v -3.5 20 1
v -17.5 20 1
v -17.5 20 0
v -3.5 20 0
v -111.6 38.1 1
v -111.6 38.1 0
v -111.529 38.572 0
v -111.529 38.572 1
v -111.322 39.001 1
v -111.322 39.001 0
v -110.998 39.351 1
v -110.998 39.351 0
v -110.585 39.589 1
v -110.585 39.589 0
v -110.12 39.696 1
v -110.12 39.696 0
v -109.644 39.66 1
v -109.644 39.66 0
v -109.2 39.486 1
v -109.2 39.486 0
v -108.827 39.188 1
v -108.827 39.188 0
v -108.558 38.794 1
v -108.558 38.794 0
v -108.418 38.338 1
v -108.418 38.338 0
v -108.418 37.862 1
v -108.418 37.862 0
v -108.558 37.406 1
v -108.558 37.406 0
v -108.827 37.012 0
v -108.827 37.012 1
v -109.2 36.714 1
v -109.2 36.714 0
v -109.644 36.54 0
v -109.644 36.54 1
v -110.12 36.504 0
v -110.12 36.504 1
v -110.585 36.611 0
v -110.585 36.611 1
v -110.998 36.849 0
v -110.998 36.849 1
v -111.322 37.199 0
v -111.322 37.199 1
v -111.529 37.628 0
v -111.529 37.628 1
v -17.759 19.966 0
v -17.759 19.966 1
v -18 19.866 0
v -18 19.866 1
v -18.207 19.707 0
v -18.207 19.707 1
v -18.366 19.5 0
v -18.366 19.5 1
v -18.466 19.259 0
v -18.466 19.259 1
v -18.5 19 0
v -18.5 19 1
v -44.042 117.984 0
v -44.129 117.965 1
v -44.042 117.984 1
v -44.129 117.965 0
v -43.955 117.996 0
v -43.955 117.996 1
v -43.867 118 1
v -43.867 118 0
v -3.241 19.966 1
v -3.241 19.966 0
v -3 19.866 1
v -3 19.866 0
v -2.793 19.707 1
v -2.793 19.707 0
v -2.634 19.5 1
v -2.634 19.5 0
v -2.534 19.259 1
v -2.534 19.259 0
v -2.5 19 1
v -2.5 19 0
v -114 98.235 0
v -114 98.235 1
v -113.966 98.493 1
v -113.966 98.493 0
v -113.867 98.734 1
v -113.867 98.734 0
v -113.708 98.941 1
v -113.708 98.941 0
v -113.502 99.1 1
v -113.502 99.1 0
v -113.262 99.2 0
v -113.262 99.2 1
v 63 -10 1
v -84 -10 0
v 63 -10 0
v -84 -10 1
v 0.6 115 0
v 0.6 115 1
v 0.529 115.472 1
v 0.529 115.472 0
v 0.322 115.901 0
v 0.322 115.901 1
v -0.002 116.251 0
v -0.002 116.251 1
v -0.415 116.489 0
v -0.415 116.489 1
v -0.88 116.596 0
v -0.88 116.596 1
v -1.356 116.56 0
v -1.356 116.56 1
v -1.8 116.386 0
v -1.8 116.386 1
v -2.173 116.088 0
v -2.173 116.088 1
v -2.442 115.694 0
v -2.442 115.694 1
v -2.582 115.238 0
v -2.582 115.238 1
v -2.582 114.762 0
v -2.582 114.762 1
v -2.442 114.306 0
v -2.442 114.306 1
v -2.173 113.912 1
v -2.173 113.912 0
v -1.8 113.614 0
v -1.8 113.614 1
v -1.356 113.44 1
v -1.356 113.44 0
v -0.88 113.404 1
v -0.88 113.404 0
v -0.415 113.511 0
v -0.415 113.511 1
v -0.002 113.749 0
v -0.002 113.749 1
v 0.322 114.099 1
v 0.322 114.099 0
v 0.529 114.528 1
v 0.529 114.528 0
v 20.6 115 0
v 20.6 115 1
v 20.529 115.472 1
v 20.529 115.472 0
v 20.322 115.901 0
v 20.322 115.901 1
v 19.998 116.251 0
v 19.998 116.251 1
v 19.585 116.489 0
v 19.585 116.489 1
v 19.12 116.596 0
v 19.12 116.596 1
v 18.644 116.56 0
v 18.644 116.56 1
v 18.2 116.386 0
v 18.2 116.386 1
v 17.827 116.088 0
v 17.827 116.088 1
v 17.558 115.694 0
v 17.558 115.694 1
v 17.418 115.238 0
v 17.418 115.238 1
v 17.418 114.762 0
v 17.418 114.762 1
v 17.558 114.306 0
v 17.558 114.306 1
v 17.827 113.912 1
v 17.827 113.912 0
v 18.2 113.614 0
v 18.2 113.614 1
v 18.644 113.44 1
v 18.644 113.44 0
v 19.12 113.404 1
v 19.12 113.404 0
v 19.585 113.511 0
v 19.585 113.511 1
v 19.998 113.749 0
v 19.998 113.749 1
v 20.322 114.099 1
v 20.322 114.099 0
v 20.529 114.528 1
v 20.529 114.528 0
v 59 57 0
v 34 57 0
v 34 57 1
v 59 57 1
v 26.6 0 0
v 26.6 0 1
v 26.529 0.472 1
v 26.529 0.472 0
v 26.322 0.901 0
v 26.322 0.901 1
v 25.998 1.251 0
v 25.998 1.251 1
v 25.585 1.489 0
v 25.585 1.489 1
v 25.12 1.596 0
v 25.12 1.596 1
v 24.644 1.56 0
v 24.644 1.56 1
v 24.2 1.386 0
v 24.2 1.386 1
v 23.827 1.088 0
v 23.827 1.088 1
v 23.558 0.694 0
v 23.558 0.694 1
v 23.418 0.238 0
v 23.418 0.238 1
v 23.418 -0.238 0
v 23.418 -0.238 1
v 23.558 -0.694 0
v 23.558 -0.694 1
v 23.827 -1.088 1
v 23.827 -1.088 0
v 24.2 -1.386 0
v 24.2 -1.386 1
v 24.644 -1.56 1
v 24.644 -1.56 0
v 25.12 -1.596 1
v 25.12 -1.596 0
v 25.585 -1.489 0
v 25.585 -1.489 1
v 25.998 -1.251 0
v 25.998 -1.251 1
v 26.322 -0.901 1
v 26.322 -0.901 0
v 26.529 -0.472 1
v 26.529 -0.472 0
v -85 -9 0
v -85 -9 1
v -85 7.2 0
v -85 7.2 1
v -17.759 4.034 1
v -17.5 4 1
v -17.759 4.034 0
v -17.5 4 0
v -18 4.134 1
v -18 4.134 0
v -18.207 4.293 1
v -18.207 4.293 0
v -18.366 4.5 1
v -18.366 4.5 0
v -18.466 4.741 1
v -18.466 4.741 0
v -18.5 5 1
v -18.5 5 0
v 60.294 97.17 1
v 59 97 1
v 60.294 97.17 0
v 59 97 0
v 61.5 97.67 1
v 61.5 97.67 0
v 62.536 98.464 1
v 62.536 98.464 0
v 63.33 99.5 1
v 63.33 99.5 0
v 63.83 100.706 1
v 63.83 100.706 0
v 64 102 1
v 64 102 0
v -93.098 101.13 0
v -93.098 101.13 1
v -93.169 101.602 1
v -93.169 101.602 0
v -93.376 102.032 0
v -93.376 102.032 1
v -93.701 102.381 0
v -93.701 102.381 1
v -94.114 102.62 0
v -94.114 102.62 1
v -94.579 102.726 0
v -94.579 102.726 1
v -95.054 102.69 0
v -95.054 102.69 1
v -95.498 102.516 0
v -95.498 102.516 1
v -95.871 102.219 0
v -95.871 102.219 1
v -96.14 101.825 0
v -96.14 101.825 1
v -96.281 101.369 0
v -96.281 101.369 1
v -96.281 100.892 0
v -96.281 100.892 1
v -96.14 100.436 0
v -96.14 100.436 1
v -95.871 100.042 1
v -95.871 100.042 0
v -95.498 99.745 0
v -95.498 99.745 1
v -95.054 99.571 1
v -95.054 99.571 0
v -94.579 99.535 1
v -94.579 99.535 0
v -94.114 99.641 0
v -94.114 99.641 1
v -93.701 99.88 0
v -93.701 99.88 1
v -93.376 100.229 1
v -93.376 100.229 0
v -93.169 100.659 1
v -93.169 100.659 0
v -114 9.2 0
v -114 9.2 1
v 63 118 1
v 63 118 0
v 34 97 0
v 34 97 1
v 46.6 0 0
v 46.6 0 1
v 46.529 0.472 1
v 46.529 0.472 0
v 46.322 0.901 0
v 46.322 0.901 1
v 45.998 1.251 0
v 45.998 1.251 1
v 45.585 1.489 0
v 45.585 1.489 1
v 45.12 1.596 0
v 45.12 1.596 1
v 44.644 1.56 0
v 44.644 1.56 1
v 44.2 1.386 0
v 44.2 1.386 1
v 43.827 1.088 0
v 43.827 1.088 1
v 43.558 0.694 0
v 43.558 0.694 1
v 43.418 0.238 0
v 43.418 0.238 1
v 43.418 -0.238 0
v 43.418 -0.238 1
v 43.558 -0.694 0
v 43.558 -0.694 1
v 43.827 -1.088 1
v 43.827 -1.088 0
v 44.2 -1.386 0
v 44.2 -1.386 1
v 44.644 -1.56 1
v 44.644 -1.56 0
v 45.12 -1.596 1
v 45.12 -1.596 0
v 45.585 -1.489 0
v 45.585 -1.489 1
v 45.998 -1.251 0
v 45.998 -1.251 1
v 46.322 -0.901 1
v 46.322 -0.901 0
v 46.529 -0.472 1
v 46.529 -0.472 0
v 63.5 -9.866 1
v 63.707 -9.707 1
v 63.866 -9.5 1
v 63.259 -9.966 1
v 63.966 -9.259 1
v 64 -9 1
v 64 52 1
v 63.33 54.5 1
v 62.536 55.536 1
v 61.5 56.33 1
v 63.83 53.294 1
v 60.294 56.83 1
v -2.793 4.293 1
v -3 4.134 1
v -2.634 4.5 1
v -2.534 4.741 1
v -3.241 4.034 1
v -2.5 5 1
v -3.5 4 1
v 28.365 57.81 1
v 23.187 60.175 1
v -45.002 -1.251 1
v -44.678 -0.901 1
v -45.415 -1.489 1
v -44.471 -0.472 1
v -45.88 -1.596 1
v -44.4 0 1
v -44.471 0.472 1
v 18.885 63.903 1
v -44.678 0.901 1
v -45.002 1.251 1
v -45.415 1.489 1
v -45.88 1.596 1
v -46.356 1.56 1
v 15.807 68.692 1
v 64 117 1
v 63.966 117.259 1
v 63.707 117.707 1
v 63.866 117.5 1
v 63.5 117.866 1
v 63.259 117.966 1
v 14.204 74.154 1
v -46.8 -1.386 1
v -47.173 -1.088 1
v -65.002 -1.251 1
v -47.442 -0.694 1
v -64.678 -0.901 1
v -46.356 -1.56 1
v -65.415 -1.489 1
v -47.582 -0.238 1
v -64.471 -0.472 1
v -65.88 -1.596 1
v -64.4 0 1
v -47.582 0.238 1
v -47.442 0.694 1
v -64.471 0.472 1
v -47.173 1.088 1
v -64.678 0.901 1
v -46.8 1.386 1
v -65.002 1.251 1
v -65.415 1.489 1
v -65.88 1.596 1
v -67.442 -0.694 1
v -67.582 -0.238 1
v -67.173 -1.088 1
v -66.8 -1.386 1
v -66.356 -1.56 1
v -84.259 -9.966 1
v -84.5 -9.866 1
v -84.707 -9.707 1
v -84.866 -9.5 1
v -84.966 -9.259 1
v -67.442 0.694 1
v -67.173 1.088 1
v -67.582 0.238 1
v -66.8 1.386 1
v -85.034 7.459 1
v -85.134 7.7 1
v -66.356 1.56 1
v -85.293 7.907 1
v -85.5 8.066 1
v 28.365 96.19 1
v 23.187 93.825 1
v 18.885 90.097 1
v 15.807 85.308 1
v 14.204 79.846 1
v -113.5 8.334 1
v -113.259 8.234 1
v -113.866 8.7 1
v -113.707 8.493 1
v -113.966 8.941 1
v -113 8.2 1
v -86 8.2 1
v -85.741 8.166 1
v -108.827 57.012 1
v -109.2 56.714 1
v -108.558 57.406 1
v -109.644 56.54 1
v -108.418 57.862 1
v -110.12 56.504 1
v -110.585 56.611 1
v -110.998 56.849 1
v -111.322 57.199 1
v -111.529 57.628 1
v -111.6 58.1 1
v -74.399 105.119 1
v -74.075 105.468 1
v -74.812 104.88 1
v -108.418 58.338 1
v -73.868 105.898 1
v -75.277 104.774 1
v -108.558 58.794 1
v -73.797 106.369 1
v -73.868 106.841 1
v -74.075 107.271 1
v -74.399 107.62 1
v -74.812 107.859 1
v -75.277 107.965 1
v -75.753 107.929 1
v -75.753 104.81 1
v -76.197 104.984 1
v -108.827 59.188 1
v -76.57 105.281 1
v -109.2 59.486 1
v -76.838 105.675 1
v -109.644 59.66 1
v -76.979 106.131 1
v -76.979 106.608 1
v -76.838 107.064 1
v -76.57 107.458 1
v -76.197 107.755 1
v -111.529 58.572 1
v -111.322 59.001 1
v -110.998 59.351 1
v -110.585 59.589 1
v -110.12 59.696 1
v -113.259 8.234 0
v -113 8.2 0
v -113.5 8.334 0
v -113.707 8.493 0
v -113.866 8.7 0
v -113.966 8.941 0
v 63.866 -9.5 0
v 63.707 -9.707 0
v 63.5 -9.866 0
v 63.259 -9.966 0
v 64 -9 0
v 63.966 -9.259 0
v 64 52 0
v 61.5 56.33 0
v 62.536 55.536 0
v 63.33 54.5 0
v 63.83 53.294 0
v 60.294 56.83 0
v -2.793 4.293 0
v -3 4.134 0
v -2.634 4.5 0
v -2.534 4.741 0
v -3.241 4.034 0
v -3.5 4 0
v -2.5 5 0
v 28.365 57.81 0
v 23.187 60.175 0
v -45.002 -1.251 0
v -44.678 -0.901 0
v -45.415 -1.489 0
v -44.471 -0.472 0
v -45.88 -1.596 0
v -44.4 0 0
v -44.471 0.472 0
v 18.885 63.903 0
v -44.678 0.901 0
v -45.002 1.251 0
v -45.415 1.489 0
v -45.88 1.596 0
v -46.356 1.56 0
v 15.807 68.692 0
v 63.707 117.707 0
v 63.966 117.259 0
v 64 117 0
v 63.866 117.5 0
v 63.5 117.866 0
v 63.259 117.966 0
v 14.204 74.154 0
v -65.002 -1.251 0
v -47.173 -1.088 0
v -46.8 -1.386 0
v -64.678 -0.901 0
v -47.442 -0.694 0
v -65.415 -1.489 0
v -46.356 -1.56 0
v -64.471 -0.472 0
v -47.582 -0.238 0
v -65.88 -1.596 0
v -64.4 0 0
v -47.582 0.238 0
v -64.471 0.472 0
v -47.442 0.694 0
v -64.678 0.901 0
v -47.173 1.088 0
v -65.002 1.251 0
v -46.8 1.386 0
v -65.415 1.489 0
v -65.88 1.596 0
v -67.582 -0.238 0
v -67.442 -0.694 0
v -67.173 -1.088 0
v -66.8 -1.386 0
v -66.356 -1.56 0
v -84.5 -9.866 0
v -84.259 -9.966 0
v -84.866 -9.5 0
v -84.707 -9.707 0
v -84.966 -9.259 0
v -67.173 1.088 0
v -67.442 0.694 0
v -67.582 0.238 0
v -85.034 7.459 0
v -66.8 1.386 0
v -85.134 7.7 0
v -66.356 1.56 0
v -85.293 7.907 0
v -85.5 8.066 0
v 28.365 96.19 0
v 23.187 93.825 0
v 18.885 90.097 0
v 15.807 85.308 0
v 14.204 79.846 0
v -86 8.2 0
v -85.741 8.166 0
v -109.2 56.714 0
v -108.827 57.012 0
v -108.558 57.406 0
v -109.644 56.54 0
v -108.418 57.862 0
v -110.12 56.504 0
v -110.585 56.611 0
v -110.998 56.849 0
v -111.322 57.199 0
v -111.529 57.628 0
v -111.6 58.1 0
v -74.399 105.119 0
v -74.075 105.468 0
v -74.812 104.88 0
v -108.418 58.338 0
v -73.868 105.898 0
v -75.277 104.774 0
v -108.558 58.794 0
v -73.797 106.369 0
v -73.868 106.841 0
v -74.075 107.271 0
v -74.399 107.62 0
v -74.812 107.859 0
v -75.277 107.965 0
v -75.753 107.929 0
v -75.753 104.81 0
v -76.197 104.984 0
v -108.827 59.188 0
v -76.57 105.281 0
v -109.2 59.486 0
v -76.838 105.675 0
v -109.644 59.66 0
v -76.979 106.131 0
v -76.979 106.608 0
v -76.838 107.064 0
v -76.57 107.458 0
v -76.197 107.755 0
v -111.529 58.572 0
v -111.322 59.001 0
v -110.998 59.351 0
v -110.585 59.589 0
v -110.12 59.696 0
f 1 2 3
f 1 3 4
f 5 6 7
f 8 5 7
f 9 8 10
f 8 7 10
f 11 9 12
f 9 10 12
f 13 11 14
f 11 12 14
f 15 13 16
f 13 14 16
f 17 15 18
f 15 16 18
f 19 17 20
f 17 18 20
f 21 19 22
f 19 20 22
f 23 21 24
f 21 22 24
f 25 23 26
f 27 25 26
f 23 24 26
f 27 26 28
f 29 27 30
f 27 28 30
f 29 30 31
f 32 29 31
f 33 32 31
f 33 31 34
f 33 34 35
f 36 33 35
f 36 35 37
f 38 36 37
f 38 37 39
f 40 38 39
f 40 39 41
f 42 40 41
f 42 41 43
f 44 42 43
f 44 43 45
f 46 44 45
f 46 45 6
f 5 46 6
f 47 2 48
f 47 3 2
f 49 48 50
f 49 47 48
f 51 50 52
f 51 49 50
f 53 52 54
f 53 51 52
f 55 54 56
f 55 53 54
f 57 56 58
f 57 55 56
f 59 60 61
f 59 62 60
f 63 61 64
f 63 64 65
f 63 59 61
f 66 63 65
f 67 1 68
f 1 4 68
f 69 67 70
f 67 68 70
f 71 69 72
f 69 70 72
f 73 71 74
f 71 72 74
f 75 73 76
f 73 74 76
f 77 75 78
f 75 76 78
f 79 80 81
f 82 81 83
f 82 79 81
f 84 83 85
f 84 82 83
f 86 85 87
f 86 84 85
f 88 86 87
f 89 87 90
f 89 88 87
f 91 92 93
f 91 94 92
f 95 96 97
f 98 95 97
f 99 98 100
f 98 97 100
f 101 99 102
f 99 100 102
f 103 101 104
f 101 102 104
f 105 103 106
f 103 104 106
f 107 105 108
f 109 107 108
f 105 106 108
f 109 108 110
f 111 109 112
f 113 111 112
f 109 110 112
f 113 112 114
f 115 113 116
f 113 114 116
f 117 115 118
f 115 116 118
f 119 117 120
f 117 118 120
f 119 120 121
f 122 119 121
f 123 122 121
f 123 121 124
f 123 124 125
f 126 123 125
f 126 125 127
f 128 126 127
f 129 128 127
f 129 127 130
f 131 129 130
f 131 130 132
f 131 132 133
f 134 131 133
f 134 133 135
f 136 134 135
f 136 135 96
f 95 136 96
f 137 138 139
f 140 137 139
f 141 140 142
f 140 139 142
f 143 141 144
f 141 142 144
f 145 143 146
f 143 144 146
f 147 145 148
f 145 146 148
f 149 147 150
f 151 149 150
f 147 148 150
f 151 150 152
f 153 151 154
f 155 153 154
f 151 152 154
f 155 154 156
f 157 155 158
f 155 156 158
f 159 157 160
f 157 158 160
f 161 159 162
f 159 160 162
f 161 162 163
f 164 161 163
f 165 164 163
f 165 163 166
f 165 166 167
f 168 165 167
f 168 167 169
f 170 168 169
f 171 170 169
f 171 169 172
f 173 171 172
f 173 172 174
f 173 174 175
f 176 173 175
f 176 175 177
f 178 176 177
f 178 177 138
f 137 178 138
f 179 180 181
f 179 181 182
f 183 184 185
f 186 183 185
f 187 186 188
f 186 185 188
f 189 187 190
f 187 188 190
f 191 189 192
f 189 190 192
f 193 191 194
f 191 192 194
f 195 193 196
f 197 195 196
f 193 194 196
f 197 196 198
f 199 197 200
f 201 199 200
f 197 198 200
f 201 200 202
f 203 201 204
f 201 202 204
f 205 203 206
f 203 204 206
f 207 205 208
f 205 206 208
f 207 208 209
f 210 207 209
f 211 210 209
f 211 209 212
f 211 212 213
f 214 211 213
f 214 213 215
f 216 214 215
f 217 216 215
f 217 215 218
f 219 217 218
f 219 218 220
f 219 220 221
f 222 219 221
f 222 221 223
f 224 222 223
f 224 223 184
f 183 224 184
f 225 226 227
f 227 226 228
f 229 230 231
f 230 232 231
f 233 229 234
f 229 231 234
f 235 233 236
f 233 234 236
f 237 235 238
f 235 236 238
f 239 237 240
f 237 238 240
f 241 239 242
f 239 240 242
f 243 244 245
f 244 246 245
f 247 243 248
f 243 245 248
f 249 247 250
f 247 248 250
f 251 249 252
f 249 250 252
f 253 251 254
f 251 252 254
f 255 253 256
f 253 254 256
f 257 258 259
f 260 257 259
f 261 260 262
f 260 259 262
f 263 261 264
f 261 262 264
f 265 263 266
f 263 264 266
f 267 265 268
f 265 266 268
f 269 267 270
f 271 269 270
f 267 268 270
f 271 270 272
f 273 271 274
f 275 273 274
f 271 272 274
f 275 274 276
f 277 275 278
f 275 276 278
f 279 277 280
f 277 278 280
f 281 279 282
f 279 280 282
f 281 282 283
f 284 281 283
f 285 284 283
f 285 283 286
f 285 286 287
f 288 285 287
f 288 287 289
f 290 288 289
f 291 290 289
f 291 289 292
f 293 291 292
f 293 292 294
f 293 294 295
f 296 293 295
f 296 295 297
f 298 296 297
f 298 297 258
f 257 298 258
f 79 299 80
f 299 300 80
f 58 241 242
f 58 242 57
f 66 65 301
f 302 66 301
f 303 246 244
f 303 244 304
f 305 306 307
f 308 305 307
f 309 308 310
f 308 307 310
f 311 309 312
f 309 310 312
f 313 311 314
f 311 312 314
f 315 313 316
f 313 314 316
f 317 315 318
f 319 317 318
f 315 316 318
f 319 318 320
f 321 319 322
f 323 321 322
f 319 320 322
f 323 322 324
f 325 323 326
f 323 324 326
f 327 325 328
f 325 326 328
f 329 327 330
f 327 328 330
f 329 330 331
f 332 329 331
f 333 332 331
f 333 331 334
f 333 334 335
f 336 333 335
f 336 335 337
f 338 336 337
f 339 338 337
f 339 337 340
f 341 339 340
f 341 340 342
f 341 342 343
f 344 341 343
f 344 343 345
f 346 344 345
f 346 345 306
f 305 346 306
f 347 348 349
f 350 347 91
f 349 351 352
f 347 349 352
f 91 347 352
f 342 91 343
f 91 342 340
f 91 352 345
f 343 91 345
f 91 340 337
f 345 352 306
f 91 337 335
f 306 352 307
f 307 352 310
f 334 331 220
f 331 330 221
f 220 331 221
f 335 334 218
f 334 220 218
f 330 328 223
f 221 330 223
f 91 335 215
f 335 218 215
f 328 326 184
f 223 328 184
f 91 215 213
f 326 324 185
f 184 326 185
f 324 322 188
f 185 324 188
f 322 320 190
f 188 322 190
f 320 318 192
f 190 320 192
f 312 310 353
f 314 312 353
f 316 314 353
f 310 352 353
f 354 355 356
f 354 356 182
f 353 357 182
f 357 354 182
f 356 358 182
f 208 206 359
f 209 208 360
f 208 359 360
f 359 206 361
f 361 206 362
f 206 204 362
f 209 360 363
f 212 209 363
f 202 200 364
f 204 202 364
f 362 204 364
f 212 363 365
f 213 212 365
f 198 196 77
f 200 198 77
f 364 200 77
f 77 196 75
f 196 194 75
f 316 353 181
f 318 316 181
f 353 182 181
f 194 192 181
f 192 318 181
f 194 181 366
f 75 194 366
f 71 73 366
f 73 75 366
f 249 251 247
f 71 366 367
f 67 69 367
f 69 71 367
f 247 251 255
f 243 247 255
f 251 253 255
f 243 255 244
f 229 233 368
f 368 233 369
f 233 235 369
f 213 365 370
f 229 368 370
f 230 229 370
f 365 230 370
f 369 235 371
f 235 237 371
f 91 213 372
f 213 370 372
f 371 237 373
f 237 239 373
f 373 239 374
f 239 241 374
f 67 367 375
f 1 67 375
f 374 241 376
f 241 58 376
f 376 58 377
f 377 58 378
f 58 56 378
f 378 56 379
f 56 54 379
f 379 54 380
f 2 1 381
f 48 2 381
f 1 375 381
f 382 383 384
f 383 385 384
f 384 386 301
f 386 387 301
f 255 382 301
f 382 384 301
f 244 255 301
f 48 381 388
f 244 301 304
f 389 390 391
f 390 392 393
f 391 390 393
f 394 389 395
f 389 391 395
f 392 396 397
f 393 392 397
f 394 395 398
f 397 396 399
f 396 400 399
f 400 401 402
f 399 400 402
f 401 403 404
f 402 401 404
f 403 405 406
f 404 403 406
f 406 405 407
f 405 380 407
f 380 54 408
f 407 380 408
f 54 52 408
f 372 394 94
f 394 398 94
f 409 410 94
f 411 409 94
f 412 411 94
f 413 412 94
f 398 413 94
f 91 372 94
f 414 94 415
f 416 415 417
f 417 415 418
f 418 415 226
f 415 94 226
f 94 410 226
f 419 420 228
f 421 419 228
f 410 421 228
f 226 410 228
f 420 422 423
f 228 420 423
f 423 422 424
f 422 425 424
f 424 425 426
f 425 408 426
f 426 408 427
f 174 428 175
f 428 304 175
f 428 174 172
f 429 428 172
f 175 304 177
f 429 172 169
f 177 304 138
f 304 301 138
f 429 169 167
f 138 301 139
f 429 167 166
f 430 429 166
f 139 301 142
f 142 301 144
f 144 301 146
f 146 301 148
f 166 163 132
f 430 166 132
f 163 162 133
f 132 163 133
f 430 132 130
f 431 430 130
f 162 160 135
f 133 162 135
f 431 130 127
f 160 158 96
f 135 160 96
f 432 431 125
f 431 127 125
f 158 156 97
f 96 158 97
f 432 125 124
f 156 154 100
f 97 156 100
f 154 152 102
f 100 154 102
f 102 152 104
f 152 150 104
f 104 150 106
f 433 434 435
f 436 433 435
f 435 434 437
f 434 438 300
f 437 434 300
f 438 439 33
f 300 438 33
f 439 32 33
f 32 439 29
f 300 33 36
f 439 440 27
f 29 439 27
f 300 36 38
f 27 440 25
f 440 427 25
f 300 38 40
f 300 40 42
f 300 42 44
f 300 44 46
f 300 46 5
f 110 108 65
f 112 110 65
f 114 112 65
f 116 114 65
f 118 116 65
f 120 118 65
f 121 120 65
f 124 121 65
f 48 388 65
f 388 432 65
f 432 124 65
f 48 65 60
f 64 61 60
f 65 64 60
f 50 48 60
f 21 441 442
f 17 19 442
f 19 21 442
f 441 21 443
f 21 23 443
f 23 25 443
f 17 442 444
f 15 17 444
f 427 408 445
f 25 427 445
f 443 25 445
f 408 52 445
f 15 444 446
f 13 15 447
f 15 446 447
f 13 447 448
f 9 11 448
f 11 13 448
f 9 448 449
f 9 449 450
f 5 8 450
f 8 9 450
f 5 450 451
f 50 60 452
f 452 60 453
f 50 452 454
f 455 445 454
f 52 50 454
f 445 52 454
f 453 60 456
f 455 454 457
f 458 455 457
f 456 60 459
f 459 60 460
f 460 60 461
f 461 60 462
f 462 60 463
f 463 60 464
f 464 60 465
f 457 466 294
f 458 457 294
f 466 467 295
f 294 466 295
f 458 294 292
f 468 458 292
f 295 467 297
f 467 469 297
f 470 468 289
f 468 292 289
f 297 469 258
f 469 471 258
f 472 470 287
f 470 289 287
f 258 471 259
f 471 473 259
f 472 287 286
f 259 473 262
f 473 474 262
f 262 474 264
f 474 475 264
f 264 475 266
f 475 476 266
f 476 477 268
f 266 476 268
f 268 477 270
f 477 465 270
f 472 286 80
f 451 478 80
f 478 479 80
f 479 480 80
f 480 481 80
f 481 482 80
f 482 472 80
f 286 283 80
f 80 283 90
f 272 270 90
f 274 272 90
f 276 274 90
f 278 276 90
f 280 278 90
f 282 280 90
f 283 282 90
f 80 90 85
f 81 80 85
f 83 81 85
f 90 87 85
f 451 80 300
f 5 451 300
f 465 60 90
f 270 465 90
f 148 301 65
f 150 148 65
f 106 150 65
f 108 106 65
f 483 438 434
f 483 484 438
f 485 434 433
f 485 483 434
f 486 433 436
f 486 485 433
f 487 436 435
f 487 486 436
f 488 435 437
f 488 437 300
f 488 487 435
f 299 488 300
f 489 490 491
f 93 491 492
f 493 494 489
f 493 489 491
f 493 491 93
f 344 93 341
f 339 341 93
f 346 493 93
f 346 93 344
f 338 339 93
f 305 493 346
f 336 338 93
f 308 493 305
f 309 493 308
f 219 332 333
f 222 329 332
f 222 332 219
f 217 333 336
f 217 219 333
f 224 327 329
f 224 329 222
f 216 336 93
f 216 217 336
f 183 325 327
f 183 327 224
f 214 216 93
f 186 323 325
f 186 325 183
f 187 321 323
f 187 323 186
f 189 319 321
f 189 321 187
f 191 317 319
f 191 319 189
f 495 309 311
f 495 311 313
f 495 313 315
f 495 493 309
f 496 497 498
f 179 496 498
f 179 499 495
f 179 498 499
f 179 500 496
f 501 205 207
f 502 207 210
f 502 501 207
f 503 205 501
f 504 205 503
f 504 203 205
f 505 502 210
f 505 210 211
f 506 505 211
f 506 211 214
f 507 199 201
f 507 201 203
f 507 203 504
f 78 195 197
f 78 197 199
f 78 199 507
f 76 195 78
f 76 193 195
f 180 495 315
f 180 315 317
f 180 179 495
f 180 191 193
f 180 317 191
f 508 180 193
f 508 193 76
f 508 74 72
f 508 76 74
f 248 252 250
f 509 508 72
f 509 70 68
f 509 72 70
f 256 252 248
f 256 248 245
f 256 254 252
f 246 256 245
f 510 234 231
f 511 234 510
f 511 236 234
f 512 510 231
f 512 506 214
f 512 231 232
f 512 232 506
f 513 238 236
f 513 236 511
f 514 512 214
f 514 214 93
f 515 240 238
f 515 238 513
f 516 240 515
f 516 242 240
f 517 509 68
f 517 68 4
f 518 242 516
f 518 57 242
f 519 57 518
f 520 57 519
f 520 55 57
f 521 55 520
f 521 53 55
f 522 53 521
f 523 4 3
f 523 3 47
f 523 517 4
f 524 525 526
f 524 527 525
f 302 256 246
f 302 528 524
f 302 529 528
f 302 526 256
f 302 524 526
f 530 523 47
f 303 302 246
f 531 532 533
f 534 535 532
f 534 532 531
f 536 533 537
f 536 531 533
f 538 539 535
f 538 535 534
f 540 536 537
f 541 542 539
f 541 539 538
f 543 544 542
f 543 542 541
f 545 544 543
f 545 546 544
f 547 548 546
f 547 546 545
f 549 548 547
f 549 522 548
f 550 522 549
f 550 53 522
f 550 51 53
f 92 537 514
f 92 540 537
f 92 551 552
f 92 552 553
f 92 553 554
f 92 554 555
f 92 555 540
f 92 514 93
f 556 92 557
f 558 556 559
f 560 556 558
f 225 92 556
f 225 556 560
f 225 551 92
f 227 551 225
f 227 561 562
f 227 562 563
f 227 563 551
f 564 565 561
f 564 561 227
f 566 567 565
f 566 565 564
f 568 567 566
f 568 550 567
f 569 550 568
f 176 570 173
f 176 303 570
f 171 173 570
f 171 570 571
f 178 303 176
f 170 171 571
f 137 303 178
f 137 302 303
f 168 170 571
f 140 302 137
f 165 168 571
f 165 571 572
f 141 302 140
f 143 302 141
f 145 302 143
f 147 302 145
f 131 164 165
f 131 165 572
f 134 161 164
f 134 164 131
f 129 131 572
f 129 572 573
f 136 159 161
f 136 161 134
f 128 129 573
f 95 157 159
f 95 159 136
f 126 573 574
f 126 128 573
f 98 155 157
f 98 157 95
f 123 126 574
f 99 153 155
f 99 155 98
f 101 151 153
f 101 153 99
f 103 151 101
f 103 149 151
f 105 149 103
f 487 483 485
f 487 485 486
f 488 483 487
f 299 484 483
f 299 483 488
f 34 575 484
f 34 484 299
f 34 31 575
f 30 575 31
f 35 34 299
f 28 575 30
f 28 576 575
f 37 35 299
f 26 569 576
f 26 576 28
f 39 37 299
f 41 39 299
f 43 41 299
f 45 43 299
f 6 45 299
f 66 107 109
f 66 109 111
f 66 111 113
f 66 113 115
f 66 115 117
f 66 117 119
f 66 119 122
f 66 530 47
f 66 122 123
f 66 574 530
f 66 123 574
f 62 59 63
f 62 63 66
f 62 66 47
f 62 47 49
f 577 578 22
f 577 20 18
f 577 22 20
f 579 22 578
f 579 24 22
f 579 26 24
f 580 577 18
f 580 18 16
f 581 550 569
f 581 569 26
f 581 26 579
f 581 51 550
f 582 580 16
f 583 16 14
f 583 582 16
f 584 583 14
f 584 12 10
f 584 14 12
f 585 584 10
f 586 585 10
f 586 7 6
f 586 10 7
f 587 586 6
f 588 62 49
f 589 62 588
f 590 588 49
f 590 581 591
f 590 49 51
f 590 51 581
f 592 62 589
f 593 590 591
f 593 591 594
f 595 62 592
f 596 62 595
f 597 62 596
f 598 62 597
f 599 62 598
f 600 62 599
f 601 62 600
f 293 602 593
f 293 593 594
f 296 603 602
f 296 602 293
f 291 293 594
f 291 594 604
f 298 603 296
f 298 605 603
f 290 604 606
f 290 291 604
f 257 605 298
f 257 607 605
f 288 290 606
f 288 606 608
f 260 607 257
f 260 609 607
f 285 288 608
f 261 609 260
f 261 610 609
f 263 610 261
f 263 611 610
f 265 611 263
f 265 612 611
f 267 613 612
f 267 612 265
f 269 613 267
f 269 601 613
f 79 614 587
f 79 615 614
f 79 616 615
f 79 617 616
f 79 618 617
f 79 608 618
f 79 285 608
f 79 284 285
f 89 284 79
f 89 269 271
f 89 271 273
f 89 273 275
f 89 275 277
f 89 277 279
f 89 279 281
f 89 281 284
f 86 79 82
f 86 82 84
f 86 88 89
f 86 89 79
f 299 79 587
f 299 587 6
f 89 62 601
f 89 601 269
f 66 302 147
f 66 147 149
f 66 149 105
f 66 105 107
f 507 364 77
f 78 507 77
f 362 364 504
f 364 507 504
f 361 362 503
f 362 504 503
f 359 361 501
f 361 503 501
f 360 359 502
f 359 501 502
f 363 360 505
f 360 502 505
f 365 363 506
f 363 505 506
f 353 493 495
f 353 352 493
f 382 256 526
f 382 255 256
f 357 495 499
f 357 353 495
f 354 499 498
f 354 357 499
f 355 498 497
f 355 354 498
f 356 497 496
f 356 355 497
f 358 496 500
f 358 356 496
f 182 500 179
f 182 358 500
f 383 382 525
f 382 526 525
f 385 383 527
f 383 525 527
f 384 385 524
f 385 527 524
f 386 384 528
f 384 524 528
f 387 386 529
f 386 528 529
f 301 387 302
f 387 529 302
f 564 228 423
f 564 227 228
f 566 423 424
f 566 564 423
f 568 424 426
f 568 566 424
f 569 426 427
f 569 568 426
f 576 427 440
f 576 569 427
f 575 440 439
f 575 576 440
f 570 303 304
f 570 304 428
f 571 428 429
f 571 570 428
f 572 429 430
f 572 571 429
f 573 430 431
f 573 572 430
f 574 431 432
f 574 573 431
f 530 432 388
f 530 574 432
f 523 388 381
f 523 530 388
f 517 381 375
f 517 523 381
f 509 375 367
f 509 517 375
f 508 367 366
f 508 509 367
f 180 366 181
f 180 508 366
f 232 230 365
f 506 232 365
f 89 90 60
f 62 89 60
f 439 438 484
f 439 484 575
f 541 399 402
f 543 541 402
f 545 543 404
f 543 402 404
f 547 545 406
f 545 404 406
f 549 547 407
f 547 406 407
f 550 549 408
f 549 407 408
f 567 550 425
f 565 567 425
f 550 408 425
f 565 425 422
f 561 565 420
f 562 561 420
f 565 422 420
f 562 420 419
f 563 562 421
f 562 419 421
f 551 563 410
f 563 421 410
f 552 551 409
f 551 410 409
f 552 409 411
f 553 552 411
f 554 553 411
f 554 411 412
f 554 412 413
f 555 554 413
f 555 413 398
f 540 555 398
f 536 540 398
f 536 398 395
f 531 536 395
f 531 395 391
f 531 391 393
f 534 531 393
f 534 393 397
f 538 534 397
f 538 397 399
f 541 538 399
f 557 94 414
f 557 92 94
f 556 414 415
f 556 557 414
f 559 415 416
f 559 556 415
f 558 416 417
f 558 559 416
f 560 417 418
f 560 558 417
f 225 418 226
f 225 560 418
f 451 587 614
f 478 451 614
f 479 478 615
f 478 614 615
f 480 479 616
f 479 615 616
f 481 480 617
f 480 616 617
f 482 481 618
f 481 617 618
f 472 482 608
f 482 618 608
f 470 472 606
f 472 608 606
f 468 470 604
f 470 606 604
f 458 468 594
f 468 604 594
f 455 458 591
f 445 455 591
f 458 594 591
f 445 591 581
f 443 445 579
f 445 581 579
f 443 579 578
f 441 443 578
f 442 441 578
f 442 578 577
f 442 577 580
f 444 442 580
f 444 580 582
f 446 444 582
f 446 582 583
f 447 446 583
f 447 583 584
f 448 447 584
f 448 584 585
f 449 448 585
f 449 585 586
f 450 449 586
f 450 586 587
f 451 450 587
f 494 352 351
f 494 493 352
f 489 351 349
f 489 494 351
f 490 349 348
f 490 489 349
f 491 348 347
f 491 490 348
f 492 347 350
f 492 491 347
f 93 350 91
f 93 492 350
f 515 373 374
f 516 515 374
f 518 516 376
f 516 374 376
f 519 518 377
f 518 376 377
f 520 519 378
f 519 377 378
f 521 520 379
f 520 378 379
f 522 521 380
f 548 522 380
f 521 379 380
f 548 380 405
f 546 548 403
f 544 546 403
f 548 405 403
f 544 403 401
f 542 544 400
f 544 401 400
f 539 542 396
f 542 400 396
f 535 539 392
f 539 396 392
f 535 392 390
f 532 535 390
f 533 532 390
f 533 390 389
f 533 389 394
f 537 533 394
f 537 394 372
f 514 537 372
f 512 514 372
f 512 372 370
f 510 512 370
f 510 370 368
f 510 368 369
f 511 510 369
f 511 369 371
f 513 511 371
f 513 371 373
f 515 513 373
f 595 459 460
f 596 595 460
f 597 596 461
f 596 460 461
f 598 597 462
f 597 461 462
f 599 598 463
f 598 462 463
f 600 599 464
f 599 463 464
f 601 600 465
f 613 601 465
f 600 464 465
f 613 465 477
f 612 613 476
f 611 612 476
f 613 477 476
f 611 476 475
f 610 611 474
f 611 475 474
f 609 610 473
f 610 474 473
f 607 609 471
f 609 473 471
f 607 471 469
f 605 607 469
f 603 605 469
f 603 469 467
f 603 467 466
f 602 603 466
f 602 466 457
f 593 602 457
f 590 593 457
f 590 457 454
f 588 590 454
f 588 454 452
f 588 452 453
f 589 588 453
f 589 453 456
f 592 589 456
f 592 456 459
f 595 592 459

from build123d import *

# Parameters (mm, degrees)
SKETCH_1_W          = 90
SKETCH_1_H          = 14
EXTRUDE_1_DEPTH     = 1
EXTRUDE_2_DEPTH     = 1
SKETCH_4_W          = 40
SKETCH_4_H          = 14
SKETCH_4_W_2        = 19
EXTRUDE_3_DEPTH     = 1
SKETCH_7_R          = 1.6
CUT_EXTRUDE_1_DEPTH = 10
SKETCH_9_R          = 1.6
CUT_EXTRUDE_3_DEPTH = 10
EXTRUDE_4_DEPTH     = 1
CUT_EXTRUDE_4_DEPTH = 10
SKETCH_13_R         = 1.6
CUT_EXTRUDE_5_DEPTH = 10
CUT_EXTRUDE_6_DEPTH = 10
FILLET_1_R          = 5
FILLET_2_R          = 1
SKETCH_15_W         = 16
SKETCH_15_H         = 16
CUT_EXTRUDE_7_DEPTH = 10
FILLET_3_R          = 1


with BuildPart() as part:
    # 草图1 → 凸台-拉伸1 (new body)
    with BuildSketch(Plane.XY):
        with Locations((0, -3)):
            Rectangle(SKETCH_1_W, SKETCH_1_H)
    extrude(amount=EXTRUDE_1_DEPTH)

    # 草图2 → 凸台-拉伸2 (add)
    with BuildSketch(Plane.XY.offset(1)):
        Polygon((-85, 8.2), (-85, 4), (64, 4), (64, 118), (-114, 98), (-114, 8.2), align=None)
    extrude(amount=-EXTRUDE_2_DEPTH)

    # 草图4 → 凸台-拉伸3 (add)
    with BuildSketch(Plane.XY.offset(1)):
        with Locations((-65, -3)):
            Rectangle(SKETCH_4_W, SKETCH_4_H)
        with Locations((54.5, -3)):
            Rectangle(SKETCH_4_W_2, SKETCH_4_H)
    extrude(amount=-EXTRUDE_3_DEPTH)

    # 草图7 → 切除-拉伸1 (cut)
    with BuildSketch(Plane.XY.offset(1)):
        with Locations((45, 0)):
            Circle(SKETCH_7_R)
        with Locations((25, 0)):
            Circle(SKETCH_7_R)
        with Locations((-66, 0)):
            Circle(SKETCH_7_R)
        with Locations((-46, 0)):
            Circle(SKETCH_7_R)
    extrude(amount=-CUT_EXTRUDE_1_DEPTH, mode=Mode.SUBTRACT)

    # 草图9 → 切除-拉伸3 (cut)
    with BuildSketch(Plane(origin=(0, 0, 0), x_dir=(-1, 0, 0), z_dir=(0, 0, -1))):
        with Locations((110, 58.1)):
            Circle(SKETCH_9_R)
        with Locations((110, 38.1)):
            Circle(SKETCH_9_R)
    extrude(amount=-CUT_EXTRUDE_3_DEPTH, mode=Mode.SUBTRACT)

    # 草图10 → 凸台-拉伸4 (add)
    with BuildSketch(Plane.XY.offset(1)):
        Polygon((-114, 98), (-114, 118), (64, 118), align=None)
    extrude(amount=-EXTRUDE_4_DEPTH)

    # 草图11 → 切除-拉伸4 (cut)
    with BuildSketch(Plane.XY.offset(1)):
        Polygon((-44, 118), (-114, 118), (-114, 99), align=None)
    extrude(amount=-CUT_EXTRUDE_4_DEPTH, mode=Mode.SUBTRACT)

    # 草图13 → 切除-拉伸5 (cut)
    with BuildSketch(Plane.XY.offset(1)):
        with Locations((-1, 115)):
            Circle(SKETCH_13_R)
        with Locations((19, 115)):
            Circle(SKETCH_13_R)
        with Locations((-75.396749016, 106.369478786)):
            Circle(SKETCH_13_R)
        with Locations((-94.698374508, 101.130466152)):
            Circle(SKETCH_13_R)
    extrude(amount=-CUT_EXTRUDE_5_DEPTH, mode=Mode.SUBTRACT)

    # 草图14 → 切除-拉伸6 (cut)
    with BuildSketch(Plane(origin=(0, 0, 0), x_dir=(-1, 0, 0), z_dir=(0, 0, -1))):
        with BuildLine():
            Line((-94, 97), (-34, 97))
            ThreePointArc((-34, 97), (-14, 77), (-34, 57))
            Line((-34, 57), (-94, 57))
            ThreePointArc((-94, 57), (-114, 77), (-94, 97))
        make_face()
    extrude(amount=-CUT_EXTRUDE_6_DEPTH, mode=Mode.SUBTRACT)

    # 圆角1
    fillet_1_edges = [part.edges().sort_by_distance(p)[0] for p in [
        (64, 57, 0.5),
        (64, 97, 0.5),
    ]]
    fillet(fillet_1_edges, radius=FILLET_1_R)

    # 圆角2
    fillet_2_edges = [part.edges().sort_by_distance(p)[0] for p in [
        (-44, 118, 0.5),
        (-114, 99, 0.5),
        (-114, 8.2, 0.5),
        (64, 118, 0.5),
        (-85, 8.2, 0.5),
        (-85, -10, 0.5),
        (64, -10, 0.5),
    ]]
    fillet(fillet_2_edges, radius=FILLET_2_R)

    # 草图15 → 切除-拉伸7 (cut)
    with BuildSketch(Plane.XY.offset(1)):
        with Locations((-10.5, 12)):
            Rectangle(SKETCH_15_W, SKETCH_15_H)
    extrude(amount=-CUT_EXTRUDE_7_DEPTH, mode=Mode.SUBTRACT)

    # 圆角3
    fillet_3_edges = [part.edges().sort_by_distance(p)[0] for p in [
        (-2.5, 20, 0.5),
        (-2.5, 4, 0.5),
        (-18.5, 4, 0.5),
        (-18.5, 20, 0.5),
    ]]
    fillet(fillet_3_edges, radius=FILLET_3_R)


solid = part.part
